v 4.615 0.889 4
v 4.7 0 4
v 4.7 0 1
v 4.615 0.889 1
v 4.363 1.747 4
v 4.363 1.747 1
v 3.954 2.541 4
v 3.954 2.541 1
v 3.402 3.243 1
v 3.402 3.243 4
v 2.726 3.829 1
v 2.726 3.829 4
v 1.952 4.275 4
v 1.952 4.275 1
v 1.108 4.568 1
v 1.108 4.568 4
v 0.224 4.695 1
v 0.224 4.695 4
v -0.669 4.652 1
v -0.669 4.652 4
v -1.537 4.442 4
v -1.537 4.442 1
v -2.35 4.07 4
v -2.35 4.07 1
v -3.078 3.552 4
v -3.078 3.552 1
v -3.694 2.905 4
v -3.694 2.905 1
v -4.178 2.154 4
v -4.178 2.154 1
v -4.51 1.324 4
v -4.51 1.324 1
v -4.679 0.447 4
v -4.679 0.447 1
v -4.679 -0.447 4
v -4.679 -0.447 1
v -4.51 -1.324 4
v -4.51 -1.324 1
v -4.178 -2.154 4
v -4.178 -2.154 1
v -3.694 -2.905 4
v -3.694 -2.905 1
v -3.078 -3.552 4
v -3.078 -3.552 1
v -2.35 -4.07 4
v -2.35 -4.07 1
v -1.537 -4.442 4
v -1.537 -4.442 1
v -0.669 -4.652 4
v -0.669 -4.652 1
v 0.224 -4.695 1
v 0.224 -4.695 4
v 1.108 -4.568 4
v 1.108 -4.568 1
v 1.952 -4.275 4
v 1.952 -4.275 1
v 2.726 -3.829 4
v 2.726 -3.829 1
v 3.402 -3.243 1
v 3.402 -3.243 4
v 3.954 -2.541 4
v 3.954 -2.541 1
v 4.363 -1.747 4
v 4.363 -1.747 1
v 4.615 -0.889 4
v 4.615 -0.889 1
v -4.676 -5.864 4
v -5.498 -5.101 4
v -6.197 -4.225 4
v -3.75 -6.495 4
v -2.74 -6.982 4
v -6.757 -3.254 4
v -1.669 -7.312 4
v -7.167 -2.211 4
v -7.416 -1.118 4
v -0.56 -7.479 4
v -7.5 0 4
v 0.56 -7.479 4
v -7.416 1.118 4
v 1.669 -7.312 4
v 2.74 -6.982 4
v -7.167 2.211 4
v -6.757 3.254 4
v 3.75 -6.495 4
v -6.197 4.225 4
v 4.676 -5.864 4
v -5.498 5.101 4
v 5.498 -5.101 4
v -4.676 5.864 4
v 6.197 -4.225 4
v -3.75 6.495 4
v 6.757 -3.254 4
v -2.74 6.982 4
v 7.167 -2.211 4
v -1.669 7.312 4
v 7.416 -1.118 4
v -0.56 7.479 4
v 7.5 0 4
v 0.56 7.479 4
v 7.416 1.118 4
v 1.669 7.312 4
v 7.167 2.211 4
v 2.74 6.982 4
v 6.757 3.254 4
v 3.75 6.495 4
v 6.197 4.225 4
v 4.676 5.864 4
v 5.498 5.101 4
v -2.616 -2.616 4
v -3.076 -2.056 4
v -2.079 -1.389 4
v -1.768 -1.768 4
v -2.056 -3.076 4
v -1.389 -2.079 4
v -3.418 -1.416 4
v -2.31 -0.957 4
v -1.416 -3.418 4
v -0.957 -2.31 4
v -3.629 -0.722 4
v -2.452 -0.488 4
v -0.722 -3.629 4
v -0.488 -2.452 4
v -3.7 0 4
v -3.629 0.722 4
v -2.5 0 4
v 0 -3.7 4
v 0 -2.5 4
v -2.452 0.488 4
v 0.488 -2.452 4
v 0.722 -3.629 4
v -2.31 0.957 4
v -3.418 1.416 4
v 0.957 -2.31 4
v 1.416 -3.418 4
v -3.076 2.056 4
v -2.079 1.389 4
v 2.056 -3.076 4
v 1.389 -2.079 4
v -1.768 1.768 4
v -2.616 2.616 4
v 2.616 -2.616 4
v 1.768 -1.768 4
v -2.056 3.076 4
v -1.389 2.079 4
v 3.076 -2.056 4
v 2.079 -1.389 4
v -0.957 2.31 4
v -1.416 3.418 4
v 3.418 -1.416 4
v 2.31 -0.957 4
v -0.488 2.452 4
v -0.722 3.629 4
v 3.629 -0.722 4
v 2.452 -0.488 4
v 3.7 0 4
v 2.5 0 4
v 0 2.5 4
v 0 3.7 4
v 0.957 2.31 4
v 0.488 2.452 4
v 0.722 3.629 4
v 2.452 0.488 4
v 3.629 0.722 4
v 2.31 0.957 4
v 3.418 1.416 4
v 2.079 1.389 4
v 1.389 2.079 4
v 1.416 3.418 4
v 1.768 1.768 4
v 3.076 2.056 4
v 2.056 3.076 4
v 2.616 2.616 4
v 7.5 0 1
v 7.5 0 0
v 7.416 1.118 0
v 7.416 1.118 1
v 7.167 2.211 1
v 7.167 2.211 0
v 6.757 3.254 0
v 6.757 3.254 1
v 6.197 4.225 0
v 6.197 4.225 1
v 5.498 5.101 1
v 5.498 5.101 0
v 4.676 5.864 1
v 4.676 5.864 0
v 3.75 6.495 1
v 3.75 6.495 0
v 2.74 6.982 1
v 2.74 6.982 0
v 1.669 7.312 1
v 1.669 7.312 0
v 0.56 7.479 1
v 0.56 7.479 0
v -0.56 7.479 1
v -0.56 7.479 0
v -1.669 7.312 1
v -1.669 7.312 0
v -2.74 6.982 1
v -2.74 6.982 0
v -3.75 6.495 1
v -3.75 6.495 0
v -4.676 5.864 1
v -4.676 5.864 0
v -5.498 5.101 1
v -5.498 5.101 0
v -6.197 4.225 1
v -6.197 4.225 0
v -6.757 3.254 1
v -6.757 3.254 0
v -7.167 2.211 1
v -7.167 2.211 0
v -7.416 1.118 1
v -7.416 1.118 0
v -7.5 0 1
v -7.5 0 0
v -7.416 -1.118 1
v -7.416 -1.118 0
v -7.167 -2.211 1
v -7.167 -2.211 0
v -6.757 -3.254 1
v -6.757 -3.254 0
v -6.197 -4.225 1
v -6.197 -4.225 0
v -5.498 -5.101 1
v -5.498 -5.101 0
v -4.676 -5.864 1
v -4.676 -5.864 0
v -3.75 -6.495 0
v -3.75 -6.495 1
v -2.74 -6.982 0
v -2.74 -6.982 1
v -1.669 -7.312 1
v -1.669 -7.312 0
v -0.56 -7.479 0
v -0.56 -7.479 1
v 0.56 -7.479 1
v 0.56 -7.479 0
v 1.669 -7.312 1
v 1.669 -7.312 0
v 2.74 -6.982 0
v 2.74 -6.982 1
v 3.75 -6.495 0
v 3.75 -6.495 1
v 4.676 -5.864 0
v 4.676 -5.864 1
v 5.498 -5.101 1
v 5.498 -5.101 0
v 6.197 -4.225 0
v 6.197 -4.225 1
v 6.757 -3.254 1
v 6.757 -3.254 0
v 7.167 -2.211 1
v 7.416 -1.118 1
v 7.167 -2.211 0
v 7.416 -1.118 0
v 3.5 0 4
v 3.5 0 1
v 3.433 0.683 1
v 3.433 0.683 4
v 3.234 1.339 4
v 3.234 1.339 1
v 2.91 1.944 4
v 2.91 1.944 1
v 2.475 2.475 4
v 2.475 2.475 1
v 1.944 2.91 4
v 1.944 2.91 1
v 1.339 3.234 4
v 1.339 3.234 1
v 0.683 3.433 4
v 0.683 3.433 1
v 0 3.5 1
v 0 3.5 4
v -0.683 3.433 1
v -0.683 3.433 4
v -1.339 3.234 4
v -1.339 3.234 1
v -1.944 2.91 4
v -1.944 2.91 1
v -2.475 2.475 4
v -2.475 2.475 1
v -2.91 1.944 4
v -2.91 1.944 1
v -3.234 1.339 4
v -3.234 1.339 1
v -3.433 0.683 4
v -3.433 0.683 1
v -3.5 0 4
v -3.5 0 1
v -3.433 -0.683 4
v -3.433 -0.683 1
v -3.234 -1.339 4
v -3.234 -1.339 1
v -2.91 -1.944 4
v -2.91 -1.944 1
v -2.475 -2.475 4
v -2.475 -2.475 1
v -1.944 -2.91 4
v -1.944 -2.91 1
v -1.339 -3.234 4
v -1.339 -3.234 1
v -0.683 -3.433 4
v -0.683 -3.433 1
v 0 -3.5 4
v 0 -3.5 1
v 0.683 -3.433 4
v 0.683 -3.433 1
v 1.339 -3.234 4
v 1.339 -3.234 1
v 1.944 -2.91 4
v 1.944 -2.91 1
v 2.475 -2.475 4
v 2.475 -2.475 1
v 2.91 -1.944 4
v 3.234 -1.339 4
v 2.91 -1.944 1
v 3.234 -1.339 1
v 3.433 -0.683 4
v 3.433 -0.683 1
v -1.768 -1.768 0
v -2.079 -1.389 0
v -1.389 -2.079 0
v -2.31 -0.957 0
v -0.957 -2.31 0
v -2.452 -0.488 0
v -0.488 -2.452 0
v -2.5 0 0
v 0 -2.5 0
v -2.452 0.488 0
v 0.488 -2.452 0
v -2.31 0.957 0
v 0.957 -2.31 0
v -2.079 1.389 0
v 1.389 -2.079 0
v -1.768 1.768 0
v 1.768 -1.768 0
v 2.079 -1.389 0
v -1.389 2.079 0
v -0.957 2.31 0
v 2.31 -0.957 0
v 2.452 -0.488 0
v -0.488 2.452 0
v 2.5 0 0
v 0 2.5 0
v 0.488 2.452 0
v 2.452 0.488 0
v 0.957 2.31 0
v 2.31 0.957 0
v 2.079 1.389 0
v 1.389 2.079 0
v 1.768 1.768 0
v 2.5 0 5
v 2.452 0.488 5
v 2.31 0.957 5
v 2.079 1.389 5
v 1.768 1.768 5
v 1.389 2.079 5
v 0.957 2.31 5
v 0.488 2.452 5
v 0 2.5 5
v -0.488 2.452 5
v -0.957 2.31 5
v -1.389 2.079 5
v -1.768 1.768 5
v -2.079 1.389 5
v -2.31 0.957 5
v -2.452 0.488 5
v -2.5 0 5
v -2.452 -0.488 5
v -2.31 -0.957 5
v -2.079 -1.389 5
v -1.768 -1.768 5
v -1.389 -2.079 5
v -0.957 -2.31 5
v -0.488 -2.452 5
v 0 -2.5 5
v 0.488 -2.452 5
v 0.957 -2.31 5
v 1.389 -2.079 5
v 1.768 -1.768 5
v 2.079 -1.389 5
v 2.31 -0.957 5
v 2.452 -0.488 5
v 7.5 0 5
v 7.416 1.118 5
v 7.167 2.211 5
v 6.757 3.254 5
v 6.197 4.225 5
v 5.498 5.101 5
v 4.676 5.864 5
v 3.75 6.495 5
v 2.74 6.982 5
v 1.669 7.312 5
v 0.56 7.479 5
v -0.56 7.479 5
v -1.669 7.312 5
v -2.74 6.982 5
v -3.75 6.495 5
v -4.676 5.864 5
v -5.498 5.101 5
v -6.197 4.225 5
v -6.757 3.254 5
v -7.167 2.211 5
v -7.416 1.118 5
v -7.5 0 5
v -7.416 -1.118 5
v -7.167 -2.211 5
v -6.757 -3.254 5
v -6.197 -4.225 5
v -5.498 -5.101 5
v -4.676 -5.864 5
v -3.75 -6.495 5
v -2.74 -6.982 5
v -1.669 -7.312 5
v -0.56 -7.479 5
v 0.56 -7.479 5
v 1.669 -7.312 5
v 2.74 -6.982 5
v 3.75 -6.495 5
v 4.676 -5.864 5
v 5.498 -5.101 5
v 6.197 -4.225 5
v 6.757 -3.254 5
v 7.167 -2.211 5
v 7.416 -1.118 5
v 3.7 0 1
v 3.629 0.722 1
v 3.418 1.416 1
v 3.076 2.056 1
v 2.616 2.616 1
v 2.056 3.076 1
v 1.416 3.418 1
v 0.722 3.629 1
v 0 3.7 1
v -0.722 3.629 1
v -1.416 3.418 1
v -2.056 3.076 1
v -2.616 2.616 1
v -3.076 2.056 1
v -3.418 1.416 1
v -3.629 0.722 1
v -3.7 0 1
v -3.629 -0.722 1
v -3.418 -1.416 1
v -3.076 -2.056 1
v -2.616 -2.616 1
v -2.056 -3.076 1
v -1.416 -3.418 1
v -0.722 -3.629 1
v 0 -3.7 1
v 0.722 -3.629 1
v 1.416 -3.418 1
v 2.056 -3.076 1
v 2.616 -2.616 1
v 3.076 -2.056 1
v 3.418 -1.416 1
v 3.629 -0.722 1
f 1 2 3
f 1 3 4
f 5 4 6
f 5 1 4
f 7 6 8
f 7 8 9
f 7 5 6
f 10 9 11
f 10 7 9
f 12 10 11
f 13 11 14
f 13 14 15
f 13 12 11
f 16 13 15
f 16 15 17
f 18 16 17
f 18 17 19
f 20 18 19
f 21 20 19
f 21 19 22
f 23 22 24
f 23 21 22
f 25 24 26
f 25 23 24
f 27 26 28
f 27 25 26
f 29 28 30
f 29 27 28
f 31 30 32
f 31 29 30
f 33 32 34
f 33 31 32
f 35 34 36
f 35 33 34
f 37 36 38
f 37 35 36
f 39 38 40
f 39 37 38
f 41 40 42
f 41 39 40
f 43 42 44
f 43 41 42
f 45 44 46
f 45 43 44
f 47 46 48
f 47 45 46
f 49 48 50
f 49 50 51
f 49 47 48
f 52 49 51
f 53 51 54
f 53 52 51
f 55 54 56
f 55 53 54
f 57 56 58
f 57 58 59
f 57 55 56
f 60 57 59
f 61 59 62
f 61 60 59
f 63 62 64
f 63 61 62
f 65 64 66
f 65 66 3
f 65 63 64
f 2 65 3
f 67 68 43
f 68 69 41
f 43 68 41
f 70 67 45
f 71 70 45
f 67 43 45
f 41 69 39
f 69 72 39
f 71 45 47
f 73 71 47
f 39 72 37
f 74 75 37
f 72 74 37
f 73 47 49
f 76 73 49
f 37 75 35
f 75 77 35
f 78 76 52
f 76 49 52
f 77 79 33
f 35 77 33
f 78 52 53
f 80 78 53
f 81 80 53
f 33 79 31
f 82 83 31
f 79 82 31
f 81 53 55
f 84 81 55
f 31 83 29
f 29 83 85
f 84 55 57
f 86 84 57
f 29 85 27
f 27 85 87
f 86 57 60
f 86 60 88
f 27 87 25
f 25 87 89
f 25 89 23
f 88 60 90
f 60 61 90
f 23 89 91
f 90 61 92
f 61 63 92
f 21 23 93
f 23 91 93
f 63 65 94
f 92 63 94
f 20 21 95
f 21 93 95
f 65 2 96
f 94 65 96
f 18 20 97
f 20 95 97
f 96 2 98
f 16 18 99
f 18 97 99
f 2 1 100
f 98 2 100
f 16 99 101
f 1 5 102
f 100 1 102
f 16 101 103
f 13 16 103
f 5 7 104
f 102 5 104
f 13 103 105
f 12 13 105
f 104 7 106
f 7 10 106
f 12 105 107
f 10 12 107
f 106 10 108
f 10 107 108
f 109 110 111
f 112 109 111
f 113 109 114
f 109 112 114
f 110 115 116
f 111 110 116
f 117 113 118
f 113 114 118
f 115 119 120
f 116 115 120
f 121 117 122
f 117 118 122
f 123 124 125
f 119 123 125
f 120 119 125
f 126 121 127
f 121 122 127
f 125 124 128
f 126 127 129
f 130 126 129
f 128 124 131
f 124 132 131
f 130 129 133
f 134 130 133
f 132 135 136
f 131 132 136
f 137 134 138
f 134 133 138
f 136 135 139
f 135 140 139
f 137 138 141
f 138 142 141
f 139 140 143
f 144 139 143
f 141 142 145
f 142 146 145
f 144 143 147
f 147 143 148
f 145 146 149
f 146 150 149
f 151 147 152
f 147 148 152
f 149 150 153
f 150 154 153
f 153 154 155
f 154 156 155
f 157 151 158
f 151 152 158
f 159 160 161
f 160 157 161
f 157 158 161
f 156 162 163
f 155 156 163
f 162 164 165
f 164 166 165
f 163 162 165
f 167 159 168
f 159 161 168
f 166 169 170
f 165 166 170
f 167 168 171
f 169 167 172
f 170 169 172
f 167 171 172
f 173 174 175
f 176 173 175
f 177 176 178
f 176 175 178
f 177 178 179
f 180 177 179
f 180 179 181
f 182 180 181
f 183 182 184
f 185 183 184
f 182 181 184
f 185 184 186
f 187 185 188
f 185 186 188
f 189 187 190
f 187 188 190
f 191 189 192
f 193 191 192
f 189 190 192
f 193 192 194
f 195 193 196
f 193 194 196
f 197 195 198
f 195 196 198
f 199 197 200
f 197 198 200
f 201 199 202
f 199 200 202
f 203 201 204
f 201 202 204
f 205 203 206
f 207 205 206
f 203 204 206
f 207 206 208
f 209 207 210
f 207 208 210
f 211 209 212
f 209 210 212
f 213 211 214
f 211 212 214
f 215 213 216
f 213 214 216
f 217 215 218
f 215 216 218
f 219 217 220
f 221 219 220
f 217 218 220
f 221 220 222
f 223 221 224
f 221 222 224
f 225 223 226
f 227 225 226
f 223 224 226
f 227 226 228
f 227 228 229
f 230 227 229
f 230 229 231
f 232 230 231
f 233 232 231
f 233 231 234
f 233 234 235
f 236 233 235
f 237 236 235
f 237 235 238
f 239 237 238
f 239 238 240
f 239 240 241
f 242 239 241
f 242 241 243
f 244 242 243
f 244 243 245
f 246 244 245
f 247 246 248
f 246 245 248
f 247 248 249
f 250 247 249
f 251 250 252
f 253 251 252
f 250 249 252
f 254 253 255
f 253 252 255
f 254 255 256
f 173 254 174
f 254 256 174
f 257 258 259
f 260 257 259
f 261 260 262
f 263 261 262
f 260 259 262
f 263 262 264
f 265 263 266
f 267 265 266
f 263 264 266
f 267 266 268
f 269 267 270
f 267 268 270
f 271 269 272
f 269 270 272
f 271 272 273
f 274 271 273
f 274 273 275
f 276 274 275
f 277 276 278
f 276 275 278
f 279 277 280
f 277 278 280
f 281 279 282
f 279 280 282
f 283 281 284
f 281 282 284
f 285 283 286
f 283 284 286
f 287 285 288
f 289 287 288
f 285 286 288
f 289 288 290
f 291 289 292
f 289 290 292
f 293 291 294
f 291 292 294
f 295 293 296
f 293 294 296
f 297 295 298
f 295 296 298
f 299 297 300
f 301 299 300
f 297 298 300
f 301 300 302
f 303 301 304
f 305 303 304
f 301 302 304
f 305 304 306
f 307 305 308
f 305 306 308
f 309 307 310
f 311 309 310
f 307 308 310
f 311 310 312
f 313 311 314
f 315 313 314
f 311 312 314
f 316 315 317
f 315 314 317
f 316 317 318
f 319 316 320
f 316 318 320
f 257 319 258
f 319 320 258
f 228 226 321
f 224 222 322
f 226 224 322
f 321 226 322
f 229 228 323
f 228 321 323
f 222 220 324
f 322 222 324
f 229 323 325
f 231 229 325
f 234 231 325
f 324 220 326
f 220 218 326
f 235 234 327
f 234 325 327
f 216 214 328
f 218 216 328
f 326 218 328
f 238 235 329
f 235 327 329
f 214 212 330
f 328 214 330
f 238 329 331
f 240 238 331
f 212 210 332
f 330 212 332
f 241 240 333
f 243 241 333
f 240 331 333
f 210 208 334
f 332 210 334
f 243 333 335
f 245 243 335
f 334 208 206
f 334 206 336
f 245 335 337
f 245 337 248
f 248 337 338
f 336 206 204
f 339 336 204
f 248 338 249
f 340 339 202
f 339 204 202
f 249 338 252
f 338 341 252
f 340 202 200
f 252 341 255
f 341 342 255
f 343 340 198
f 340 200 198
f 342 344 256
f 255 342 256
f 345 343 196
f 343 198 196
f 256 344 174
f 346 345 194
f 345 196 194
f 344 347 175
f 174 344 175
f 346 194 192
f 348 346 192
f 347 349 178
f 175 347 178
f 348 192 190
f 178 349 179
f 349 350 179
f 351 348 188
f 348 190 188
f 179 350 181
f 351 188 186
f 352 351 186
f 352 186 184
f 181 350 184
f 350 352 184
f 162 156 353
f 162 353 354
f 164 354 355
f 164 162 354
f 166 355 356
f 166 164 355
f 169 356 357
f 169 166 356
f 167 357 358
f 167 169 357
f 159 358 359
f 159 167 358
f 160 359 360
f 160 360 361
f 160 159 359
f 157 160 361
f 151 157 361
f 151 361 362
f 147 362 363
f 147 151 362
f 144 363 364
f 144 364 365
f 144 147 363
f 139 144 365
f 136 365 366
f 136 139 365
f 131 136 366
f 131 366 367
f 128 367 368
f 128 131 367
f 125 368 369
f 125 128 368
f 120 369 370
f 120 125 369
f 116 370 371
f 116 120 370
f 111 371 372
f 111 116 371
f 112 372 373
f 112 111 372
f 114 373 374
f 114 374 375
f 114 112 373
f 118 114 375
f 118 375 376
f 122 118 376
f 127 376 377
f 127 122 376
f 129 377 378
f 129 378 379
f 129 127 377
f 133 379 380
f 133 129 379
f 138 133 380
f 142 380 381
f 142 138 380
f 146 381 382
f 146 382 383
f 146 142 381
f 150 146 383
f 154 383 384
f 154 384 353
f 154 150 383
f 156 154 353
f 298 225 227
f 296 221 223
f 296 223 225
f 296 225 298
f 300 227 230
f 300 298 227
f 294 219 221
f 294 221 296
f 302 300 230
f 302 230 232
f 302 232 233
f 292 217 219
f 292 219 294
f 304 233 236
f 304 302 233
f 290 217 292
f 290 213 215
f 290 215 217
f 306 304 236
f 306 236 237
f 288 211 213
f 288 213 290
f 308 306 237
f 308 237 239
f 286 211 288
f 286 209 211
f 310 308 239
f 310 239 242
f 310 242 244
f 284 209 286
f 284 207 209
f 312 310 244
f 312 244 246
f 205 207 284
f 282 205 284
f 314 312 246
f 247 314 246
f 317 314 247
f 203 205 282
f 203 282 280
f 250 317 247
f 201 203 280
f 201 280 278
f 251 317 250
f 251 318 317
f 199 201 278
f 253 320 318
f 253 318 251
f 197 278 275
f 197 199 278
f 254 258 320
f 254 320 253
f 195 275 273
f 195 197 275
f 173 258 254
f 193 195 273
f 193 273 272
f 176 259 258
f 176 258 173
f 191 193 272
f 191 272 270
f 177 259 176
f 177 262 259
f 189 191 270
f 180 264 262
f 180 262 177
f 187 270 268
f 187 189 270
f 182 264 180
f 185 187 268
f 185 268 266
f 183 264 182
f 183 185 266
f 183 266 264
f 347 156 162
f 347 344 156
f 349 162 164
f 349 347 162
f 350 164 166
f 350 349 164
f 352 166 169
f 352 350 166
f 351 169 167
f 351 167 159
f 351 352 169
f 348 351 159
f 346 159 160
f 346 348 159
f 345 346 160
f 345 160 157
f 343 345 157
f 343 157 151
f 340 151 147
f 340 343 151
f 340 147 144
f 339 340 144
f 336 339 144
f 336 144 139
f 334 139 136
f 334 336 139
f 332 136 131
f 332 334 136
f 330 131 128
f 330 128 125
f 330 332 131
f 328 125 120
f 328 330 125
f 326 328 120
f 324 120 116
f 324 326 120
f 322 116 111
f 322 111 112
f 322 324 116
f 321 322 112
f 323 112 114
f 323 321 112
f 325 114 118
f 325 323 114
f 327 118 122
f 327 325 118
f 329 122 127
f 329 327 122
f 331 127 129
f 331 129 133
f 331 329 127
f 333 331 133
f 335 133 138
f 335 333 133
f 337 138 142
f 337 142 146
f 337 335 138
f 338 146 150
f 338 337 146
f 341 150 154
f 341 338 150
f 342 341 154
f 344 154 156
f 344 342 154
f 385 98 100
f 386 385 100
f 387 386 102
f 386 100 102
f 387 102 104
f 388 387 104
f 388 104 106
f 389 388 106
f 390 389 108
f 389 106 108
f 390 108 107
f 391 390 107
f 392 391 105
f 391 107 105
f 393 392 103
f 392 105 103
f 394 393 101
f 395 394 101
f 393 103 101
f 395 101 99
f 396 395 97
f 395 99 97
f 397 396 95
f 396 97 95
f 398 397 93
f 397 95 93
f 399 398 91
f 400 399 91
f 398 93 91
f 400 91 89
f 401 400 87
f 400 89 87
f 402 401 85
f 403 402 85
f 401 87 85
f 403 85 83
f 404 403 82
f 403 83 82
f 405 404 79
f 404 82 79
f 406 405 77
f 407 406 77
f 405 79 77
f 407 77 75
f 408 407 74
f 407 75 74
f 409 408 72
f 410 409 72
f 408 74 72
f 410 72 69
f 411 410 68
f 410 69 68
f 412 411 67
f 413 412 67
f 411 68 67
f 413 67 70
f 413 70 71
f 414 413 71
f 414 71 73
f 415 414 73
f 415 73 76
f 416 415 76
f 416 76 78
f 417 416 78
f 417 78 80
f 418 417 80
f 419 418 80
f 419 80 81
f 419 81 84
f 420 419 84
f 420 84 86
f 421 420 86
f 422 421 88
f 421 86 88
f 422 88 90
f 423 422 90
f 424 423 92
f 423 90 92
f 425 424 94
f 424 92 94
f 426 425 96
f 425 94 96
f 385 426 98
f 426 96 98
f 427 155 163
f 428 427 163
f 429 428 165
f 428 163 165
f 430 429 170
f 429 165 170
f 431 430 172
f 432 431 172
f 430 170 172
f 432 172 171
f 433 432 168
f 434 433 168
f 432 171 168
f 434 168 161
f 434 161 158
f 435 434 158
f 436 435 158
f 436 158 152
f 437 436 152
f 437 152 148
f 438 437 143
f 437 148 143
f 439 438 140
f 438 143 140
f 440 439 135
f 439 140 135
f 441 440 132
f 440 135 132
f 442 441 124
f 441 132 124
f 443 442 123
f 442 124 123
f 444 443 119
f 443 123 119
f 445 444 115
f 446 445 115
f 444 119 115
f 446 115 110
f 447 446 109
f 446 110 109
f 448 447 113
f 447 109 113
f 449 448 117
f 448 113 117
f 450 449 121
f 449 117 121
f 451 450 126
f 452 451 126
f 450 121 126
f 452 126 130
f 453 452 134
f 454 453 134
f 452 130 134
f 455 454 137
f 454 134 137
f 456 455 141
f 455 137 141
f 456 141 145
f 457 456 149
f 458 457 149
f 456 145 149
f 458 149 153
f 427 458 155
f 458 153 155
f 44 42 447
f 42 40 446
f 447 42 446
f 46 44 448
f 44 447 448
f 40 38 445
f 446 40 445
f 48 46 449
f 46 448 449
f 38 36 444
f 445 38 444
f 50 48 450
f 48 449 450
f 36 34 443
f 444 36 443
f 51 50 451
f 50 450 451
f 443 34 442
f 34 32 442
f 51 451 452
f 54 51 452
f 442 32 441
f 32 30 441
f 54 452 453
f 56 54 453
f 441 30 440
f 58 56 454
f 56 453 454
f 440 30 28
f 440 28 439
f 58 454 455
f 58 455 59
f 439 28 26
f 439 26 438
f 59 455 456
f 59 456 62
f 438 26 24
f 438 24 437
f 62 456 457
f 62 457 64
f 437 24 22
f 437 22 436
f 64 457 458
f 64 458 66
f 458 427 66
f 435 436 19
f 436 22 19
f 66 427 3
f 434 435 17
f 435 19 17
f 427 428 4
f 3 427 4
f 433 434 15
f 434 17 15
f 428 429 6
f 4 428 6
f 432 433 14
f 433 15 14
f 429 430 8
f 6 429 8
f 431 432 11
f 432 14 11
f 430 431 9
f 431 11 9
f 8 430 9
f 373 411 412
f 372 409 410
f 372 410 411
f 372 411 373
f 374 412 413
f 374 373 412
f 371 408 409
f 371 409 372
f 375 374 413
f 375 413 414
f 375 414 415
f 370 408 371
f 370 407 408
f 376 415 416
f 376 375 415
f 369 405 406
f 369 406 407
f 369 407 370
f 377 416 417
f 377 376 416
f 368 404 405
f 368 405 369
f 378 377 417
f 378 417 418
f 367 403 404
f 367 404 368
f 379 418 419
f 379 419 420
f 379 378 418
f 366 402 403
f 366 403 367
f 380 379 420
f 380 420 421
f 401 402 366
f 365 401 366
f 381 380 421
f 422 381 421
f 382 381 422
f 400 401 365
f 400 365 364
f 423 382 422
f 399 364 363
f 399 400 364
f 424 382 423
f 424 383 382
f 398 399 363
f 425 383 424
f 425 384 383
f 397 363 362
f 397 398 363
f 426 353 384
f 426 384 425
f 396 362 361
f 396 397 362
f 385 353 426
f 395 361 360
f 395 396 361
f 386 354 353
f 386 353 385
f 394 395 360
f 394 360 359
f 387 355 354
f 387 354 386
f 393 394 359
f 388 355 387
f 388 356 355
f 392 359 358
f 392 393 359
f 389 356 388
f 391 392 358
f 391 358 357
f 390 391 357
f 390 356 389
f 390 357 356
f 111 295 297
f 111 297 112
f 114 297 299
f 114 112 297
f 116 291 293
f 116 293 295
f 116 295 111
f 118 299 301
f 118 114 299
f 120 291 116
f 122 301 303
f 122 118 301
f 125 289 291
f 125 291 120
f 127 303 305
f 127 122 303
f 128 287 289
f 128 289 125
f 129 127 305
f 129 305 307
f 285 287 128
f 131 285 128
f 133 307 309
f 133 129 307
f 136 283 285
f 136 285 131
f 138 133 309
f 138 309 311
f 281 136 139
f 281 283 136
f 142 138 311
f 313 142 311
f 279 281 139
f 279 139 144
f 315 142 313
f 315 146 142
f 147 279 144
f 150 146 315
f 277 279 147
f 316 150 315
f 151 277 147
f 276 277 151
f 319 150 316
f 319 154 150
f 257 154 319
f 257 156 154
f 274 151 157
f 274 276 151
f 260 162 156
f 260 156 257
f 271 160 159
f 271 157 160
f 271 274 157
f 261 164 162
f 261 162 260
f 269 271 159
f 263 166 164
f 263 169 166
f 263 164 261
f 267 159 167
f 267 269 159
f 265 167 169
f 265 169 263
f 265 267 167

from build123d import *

# Parameters (mm, degrees)
F0_R     = 7.5
F0_R_2   = 3.5
F0_R_3   = 2.5
F1_DEPTH = 1
F2_R     = 3.5
F2_R_2   = 2.5
F3_DEPTH = 3
F4_R     = 4.7
F4_R_2   = 3.7
F5_DEPTH = 3
F4_R_3   = 7.5
F4_R_4   = 3.5
F4_R_5   = 2.5
F6_DEPTH = 1


with BuildPart() as f1:
    # F0 (on Top) → F1 (new body)
    with BuildSketch(Plane.XY):
        Circle(F0_R)
        Circle(F0_R_2, mode=Mode.SUBTRACT)
        Circle(F0_R_2)
        Circle(F0_R_3, mode=Mode.SUBTRACT)
    extrude(amount=F1_DEPTH)

    # F2 (on face) → F3 (join)
    with BuildSketch(Plane.XY.offset(1)):
        Circle(F2_R)
        Circle(F2_R_2, mode=Mode.SUBTRACT)
    extrude(amount=F3_DEPTH)


with BuildPart() as f5:
    # F4 (on face) → F5 (new body, through all)
    with BuildSketch(Plane.XY.offset(4)):
        Circle(F4_R)
        Circle(F4_R_2, mode=Mode.SUBTRACT)
    extrude(amount=-F5_DEPTH)

    # F4 (on face) → F6 (join)
    with BuildSketch(Plane.XY.offset(4)):
        Circle(F4_R_3)
        Circle(F4_R, mode=Mode.SUBTRACT)
        Circle(F4_R)
        Circle(F4_R_2, mode=Mode.SUBTRACT)
        Circle(F4_R_2)
        Circle(F4_R_4, mode=Mode.SUBTRACT)
        Circle(F4_R_4)
        Circle(F4_R_5, mode=Mode.SUBTRACT)
    extrude(amount=F6_DEPTH)


solid = Compound([f1.part, f5.part])
